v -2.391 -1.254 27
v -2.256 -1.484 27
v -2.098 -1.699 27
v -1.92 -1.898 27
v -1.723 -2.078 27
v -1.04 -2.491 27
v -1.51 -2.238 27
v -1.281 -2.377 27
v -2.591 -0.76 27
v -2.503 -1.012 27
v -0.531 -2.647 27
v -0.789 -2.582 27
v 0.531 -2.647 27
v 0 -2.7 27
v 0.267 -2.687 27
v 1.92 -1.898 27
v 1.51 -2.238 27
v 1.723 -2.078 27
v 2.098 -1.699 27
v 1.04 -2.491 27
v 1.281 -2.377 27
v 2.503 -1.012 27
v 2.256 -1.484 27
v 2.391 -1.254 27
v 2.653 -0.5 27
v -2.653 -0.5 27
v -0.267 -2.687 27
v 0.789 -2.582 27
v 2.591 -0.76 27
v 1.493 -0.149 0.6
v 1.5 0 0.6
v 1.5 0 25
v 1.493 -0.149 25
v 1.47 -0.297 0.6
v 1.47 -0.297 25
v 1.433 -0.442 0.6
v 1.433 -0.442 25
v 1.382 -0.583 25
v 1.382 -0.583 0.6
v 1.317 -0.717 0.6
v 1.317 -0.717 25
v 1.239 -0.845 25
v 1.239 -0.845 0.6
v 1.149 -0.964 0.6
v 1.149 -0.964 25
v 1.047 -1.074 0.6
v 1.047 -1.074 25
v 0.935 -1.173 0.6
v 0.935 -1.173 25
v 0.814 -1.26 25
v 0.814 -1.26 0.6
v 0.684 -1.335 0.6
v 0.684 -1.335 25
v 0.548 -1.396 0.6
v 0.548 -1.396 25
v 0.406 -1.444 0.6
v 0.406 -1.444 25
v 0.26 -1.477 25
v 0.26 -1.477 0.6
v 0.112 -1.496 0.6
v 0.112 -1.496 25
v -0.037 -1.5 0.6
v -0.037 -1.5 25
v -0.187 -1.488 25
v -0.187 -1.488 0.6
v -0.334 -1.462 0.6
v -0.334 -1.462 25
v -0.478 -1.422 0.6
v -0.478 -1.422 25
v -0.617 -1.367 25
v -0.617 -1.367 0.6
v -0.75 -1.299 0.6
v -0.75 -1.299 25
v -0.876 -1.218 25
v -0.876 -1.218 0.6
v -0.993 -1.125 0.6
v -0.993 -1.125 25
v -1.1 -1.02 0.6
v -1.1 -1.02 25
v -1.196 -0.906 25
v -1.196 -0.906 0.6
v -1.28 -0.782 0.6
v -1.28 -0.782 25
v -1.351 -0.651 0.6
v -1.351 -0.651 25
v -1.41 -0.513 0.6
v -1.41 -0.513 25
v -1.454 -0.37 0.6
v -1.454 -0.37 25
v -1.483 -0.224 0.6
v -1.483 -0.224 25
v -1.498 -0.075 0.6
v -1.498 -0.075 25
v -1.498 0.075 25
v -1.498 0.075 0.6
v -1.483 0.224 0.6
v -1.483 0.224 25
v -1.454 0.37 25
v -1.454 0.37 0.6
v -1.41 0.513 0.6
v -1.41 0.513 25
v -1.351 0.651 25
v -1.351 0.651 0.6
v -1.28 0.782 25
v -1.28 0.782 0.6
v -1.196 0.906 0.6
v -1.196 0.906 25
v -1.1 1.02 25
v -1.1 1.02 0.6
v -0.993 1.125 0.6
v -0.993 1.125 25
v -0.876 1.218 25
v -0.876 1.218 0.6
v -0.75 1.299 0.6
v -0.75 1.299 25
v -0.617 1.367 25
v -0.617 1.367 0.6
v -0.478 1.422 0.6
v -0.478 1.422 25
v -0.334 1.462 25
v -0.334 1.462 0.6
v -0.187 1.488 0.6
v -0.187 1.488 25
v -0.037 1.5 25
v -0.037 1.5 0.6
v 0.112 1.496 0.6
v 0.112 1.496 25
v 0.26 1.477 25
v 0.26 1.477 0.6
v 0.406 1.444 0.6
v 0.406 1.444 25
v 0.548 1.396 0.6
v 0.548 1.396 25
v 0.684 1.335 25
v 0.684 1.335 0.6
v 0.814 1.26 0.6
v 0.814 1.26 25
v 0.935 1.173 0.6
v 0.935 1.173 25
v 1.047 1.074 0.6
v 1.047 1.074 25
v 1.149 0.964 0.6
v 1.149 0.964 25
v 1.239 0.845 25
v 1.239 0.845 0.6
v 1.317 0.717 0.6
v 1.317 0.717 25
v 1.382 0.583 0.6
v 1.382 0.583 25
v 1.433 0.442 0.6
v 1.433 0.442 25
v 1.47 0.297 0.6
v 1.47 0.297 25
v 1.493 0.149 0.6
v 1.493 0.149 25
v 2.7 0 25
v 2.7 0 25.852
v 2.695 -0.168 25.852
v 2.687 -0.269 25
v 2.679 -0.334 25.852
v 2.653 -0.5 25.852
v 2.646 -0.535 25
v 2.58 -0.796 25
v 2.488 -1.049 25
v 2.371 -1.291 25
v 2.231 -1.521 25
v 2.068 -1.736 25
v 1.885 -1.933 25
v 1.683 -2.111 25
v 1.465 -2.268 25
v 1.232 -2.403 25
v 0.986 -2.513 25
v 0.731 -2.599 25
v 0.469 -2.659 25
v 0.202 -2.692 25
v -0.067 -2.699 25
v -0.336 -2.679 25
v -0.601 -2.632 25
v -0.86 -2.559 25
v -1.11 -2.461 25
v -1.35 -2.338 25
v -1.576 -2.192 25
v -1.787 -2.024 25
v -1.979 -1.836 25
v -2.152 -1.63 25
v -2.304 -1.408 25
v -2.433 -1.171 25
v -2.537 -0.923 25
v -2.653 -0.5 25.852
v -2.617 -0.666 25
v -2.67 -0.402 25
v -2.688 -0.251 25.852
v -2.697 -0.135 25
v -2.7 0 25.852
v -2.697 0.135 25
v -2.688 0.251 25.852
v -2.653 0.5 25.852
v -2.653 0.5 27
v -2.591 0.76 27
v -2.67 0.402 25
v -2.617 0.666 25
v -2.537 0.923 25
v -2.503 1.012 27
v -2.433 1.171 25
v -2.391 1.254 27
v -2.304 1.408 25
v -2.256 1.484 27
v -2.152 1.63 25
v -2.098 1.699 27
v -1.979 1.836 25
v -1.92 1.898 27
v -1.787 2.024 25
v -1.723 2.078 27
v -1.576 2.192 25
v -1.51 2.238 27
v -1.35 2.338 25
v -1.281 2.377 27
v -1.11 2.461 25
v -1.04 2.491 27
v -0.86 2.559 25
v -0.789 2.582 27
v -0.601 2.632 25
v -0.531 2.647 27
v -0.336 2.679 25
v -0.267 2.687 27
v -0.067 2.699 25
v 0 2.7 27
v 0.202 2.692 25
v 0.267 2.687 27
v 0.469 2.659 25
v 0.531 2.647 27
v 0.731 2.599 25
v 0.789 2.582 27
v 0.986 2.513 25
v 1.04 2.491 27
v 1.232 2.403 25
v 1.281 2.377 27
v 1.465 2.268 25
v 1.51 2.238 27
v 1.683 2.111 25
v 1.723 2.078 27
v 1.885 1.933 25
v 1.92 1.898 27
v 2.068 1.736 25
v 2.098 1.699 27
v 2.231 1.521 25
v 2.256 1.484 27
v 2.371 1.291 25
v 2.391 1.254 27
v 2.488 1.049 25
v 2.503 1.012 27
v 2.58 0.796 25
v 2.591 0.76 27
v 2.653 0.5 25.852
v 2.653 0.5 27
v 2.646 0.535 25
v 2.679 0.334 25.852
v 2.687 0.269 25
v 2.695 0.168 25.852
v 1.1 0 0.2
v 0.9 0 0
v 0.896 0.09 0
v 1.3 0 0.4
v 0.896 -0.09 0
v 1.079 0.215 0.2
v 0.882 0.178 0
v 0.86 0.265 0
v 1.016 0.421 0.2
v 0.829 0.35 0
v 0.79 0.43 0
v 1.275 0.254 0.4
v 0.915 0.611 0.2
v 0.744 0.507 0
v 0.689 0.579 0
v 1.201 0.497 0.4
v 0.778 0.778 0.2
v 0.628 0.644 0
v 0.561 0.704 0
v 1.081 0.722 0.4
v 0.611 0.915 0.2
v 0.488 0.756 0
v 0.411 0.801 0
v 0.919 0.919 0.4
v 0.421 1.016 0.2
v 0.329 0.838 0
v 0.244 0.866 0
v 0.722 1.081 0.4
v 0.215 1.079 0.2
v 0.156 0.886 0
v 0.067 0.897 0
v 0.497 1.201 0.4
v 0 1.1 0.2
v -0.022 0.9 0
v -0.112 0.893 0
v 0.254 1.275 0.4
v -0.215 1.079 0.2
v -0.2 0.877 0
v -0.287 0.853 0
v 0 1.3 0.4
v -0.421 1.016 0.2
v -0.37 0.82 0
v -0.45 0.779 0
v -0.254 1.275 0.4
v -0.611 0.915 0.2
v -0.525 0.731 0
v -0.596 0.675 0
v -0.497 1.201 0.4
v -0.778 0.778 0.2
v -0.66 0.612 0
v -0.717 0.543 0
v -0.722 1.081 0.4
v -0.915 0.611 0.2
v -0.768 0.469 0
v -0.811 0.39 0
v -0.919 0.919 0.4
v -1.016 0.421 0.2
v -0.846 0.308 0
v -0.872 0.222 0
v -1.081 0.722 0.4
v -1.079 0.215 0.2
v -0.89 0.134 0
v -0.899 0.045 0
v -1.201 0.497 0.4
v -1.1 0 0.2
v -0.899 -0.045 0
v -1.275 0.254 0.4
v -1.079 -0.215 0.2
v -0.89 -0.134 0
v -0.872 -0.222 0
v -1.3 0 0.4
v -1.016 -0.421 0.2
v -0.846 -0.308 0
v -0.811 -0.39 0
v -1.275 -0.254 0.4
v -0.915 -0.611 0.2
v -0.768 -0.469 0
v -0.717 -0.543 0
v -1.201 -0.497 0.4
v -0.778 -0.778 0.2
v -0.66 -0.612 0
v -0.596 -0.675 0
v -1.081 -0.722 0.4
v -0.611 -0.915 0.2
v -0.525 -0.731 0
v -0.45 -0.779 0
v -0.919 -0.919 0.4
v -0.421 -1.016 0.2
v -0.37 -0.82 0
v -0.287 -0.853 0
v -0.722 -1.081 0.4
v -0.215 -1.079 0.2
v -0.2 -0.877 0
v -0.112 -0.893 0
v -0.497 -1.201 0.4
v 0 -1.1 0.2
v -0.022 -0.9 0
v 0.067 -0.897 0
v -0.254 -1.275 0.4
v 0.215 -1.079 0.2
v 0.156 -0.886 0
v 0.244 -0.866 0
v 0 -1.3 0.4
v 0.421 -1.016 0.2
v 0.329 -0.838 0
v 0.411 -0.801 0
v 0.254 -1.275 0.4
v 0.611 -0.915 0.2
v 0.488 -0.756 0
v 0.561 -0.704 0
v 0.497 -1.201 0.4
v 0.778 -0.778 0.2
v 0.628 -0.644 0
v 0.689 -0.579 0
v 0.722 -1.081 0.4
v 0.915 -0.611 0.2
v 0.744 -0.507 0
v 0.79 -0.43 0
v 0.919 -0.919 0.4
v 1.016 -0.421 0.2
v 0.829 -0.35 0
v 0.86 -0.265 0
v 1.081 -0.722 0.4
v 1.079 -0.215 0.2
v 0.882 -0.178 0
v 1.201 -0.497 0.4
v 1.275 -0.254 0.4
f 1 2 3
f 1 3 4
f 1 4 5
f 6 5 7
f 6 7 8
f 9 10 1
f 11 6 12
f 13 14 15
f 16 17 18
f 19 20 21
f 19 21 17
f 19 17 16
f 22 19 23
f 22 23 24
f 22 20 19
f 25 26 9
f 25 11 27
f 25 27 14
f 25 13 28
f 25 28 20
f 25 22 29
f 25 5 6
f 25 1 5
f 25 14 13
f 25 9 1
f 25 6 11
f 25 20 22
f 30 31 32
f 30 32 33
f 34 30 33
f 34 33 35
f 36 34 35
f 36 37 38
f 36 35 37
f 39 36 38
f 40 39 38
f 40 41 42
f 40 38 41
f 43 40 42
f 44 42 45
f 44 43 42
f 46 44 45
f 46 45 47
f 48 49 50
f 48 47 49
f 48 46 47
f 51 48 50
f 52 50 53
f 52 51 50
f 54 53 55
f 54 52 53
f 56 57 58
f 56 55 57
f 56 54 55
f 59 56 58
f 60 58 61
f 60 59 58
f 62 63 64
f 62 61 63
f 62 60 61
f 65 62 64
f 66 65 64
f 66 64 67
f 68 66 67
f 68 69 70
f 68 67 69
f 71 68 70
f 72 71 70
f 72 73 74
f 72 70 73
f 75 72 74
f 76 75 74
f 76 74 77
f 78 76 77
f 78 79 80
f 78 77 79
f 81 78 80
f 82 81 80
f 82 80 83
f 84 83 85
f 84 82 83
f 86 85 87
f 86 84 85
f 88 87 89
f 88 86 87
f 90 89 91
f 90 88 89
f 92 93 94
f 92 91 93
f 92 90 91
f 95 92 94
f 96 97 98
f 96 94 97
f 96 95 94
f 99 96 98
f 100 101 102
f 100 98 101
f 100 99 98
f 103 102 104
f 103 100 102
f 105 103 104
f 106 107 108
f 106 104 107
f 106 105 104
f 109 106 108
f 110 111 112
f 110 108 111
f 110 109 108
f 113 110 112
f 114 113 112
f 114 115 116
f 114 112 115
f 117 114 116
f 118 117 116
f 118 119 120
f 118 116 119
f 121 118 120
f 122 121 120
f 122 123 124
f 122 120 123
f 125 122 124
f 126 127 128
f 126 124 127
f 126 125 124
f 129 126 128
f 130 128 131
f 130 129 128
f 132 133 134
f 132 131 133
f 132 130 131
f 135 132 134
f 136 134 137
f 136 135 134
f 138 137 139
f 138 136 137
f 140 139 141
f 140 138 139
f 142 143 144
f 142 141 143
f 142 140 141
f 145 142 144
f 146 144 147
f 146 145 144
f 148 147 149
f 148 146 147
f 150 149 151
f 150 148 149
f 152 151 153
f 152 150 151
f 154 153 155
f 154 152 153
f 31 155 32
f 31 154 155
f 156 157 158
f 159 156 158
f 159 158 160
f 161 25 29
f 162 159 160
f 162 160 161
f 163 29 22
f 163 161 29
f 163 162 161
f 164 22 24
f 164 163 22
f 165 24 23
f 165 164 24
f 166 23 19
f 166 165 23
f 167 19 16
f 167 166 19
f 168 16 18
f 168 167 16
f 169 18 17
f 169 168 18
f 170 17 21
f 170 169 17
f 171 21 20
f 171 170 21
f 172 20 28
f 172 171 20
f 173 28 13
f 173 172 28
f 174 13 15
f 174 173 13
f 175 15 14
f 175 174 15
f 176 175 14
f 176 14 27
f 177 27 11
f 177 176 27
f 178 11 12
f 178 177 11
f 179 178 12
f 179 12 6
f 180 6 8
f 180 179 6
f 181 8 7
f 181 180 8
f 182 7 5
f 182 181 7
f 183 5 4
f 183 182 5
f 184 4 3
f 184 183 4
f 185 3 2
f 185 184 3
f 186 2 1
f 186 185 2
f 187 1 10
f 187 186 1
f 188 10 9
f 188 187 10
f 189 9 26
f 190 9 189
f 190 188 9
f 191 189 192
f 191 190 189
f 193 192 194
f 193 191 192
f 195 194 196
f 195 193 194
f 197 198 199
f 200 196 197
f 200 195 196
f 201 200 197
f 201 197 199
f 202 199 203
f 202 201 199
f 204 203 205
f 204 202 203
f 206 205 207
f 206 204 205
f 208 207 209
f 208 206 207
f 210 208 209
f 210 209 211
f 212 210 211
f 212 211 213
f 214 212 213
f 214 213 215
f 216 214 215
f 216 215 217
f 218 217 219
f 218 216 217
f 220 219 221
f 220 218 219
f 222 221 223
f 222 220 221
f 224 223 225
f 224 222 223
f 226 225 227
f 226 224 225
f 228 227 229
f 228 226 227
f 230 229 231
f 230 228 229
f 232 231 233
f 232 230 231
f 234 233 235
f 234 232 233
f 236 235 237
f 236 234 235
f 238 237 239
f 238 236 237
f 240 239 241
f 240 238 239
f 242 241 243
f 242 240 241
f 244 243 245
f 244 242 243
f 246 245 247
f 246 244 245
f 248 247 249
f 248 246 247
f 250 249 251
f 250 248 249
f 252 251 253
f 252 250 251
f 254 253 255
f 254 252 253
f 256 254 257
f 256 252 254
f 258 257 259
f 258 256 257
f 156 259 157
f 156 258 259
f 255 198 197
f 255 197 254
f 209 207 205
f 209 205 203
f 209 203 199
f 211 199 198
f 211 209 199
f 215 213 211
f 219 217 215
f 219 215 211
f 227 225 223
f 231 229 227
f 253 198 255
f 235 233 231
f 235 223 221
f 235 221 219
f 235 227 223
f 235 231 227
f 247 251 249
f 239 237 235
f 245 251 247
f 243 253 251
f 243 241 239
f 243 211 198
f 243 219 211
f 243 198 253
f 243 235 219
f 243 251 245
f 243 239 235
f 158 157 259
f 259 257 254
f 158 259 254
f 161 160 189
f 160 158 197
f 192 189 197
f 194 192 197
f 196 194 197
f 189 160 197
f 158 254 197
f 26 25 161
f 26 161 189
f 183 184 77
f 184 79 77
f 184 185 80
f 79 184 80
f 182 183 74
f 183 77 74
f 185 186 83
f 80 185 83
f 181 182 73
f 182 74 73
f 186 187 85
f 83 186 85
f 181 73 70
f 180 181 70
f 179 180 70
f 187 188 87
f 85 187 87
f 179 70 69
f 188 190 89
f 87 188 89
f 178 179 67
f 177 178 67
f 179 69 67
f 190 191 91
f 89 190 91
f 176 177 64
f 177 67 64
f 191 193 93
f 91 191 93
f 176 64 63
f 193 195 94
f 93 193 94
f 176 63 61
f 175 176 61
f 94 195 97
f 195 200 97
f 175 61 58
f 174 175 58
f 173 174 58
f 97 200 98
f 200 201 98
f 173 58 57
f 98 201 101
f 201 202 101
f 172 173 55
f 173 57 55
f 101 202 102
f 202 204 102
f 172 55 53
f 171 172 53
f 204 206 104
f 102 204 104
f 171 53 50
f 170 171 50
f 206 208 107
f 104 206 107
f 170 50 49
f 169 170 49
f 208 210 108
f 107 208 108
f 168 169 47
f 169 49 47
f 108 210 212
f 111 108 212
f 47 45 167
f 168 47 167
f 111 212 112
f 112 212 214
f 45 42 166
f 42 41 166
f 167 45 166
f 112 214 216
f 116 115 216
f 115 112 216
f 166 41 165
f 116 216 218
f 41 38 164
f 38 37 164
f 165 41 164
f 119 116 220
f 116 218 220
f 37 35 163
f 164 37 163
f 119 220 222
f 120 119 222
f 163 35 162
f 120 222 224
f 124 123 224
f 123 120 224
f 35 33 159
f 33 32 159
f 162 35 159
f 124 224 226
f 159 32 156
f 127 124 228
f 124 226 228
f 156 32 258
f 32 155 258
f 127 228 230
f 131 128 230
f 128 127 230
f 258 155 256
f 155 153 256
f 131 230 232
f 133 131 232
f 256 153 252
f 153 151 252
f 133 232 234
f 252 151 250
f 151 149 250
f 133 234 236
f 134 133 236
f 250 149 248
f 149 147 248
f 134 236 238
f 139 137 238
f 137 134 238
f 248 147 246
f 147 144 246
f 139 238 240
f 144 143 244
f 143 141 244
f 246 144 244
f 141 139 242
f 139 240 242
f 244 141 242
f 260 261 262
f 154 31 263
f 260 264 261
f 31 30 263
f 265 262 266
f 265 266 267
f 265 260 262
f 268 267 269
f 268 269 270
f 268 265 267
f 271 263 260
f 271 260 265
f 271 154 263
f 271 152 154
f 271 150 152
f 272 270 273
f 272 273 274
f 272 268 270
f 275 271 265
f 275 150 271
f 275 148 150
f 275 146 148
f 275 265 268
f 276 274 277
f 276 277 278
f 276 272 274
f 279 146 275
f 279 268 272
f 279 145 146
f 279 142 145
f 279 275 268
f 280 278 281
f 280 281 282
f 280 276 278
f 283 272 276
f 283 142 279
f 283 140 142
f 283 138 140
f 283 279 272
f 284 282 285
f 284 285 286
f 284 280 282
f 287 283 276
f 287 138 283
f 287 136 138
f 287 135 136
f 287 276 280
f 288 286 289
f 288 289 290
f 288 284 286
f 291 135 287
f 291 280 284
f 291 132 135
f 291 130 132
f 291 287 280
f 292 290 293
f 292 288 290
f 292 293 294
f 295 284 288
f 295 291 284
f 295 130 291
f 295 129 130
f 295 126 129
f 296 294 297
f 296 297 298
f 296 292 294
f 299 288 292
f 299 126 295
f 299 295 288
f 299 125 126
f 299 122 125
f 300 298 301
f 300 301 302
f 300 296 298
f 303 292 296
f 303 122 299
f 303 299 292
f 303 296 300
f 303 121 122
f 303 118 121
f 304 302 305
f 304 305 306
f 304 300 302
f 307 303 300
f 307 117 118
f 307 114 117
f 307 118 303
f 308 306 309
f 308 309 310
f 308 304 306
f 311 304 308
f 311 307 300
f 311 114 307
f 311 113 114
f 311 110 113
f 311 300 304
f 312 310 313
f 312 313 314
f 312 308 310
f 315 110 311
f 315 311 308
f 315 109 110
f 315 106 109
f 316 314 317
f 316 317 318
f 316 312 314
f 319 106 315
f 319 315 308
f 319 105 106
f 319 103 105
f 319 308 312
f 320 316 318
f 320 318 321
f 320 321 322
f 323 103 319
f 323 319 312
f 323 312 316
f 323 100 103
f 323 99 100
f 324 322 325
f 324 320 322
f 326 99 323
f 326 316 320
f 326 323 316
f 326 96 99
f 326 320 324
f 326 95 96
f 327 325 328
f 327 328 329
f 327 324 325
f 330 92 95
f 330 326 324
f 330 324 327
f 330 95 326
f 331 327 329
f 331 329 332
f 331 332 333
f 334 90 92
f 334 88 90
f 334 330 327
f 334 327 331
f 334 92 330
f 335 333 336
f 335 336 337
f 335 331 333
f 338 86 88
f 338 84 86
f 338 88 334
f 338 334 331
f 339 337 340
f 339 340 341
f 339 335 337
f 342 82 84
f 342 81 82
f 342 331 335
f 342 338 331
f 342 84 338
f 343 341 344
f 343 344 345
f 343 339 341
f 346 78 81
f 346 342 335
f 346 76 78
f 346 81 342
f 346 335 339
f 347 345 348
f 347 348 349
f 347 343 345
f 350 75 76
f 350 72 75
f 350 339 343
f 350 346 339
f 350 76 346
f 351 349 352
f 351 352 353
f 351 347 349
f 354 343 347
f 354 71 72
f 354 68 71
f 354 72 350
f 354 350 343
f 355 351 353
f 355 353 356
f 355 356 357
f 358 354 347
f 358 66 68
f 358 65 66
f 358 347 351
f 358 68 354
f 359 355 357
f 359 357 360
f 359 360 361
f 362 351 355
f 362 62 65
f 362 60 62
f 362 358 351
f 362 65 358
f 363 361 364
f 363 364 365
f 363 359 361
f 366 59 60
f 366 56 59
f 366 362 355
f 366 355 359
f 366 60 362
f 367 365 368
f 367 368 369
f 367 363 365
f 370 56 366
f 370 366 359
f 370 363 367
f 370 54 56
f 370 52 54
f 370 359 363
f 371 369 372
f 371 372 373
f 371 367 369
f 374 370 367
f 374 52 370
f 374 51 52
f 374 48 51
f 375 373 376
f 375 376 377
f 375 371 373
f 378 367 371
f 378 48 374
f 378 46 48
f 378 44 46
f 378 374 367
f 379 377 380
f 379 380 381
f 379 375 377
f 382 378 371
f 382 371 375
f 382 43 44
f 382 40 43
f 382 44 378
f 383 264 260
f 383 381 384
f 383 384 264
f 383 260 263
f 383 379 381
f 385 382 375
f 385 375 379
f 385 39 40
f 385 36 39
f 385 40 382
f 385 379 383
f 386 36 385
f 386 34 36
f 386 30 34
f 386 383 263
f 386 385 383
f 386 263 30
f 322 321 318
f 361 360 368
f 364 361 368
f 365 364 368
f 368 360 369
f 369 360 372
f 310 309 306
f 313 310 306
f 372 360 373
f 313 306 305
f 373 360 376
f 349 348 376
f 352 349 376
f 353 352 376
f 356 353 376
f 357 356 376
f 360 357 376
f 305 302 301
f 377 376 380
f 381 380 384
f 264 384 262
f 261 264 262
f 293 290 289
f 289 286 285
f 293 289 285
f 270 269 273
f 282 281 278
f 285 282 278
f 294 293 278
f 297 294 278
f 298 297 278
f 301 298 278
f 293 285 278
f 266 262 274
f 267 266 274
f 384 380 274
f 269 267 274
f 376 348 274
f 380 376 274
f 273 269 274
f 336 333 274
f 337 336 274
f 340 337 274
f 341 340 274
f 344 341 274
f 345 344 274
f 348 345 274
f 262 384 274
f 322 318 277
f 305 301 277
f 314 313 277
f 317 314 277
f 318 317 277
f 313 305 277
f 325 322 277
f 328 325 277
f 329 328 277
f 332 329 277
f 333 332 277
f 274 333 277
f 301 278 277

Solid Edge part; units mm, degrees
sketch "Sketch1" plane through (0, 0, 0) normal (0, 0, 1) x (1, 0, 0)
  circle A0 centre (0, 0) radius 1.5
  dimension "D1" = 3
extrude "Protrusion1" add sketch "Sketch1" along normal blind 25
chamfer "Chaflán_1" distance 0.6 angle 45 1 edges at (-1.5, 0, 0)
sketch "Sketch2" plane through (0, 0, 25) normal (0, 0, 1) x (1, 0, 0)
  circle A0 centre (0, 0) radius 2.7
  dimension "D1" = 5.4
extrude "ProtrusiónExtruida_3" add sketch "Sketch2" along normal blind 2
sketch "Sketch3" plane through (0, 0, 27) normal (0, 0, 1) x (0, 1, 0)
  line L0 (0.5, -3.2084) -> (-0.5, -3.2084)
  line L1 (-0.5, -3.2084) -> (-0.5, 3.2084)
  line L2 (-0.5, 3.2084) -> (0.5, 3.2084)
  line L3 (0.5, 3.2084) -> (0.5, -3.2084)
  dimension "D1" = 0.5
extrude "VaciadoExtruido_5" cut sketch "Sketch3" against normal blind 1.148
properties material "Acero inoxidable, 303"
